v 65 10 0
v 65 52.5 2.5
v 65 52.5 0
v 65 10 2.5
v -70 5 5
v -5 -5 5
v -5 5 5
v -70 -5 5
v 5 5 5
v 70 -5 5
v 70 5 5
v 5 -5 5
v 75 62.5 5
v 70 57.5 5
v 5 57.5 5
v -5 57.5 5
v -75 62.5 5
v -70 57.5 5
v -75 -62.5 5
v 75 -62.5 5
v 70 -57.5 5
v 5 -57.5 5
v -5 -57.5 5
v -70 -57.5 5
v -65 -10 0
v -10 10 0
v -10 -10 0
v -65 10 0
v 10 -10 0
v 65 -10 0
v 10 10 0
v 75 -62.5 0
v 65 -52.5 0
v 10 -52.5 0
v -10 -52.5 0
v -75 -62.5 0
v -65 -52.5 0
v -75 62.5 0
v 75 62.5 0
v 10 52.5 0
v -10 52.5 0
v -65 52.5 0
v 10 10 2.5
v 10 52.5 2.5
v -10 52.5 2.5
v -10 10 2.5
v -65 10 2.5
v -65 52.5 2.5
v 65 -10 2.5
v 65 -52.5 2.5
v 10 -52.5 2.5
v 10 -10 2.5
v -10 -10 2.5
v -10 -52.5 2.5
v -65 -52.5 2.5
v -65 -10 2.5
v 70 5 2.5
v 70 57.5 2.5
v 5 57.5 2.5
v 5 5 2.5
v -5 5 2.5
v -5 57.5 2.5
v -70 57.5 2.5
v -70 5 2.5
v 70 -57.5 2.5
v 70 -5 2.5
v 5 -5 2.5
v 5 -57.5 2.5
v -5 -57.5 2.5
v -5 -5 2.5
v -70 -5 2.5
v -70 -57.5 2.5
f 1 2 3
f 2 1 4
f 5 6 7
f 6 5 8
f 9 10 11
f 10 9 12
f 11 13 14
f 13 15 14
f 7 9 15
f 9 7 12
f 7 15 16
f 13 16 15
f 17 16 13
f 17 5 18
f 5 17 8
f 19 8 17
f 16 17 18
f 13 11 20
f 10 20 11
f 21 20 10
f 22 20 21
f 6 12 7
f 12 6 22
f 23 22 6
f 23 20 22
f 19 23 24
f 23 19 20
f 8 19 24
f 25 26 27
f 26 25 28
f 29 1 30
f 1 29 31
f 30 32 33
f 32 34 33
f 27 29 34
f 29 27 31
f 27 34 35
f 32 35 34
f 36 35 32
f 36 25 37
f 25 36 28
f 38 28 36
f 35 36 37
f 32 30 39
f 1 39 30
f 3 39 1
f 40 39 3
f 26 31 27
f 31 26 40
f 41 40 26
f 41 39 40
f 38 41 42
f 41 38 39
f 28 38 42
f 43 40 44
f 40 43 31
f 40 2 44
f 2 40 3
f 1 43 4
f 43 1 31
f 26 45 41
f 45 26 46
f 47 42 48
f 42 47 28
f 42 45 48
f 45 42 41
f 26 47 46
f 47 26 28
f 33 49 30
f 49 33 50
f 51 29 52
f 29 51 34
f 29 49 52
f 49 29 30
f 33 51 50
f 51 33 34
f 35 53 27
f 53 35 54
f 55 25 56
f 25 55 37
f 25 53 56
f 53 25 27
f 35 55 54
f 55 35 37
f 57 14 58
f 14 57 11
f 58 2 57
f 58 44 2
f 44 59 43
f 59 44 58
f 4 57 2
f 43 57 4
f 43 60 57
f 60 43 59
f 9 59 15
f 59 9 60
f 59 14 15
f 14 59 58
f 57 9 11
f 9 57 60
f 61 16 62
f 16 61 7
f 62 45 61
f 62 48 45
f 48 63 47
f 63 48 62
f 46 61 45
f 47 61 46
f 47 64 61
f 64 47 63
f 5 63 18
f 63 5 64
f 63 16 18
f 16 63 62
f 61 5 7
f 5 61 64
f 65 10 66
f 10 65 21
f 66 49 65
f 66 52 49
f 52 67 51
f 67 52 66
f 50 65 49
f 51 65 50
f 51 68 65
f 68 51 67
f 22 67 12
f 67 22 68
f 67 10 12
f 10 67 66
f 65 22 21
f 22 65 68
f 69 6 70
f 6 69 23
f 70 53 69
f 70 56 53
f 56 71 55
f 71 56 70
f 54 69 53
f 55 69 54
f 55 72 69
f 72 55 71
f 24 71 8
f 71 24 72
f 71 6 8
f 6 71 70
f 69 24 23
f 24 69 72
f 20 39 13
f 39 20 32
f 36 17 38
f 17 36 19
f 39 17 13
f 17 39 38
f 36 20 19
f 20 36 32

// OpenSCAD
filter();

module filter()
{
    width=150;
    length=125;
    depth=5;
    thickness=10;
    
    translate([0,0,depth/2])
    difference()
    {
        cube([width, length, depth], center=true);
        
        union()
        {
            union()
            {
                negative_width = width/2 - thickness*2;
                negative_length = length/2 - thickness*2;
                
                x_offset = negative_width/2 + thickness;
                y_offset = negative_length/2 + thickness;
                
                translate([x_offset, y_offset, 0])
                cube([negative_width, negative_length, depth], center=true);
                
                translate([-x_offset, y_offset, 0])
                cube([negative_width, negative_length, depth], center=true);
                
                translate([x_offset, -y_offset, 0])
                cube([negative_width, negative_length, depth], center=true);
                
                translate([-x_offset, -y_offset, 0])
                cube([negative_width, negative_length, depth], center=true);
            }
            
            union()
            {
                negative_width = width/2 - thickness;
                negative_length = length/2 - thickness;
                
                x_offset = negative_width/2 + thickness/2;
                y_offset = negative_length/2 + thickness/2;
                
                translate([x_offset, y_offset, depth/4])
                cube([negative_width, negative_length, depth/2], center=true);
                
                translate([-x_offset, y_offset, depth/4])
                cube([negative_width, negative_length, depth/2], center=true);
                
                translate([x_offset, -y_offset, depth/4])
                cube([negative_width, negative_length, depth/2], center=true);
                
                translate([-x_offset, -y_offset, depth/4])
                cube([negative_width, negative_length, depth/2], center=true);
            }
        }
    }
}
